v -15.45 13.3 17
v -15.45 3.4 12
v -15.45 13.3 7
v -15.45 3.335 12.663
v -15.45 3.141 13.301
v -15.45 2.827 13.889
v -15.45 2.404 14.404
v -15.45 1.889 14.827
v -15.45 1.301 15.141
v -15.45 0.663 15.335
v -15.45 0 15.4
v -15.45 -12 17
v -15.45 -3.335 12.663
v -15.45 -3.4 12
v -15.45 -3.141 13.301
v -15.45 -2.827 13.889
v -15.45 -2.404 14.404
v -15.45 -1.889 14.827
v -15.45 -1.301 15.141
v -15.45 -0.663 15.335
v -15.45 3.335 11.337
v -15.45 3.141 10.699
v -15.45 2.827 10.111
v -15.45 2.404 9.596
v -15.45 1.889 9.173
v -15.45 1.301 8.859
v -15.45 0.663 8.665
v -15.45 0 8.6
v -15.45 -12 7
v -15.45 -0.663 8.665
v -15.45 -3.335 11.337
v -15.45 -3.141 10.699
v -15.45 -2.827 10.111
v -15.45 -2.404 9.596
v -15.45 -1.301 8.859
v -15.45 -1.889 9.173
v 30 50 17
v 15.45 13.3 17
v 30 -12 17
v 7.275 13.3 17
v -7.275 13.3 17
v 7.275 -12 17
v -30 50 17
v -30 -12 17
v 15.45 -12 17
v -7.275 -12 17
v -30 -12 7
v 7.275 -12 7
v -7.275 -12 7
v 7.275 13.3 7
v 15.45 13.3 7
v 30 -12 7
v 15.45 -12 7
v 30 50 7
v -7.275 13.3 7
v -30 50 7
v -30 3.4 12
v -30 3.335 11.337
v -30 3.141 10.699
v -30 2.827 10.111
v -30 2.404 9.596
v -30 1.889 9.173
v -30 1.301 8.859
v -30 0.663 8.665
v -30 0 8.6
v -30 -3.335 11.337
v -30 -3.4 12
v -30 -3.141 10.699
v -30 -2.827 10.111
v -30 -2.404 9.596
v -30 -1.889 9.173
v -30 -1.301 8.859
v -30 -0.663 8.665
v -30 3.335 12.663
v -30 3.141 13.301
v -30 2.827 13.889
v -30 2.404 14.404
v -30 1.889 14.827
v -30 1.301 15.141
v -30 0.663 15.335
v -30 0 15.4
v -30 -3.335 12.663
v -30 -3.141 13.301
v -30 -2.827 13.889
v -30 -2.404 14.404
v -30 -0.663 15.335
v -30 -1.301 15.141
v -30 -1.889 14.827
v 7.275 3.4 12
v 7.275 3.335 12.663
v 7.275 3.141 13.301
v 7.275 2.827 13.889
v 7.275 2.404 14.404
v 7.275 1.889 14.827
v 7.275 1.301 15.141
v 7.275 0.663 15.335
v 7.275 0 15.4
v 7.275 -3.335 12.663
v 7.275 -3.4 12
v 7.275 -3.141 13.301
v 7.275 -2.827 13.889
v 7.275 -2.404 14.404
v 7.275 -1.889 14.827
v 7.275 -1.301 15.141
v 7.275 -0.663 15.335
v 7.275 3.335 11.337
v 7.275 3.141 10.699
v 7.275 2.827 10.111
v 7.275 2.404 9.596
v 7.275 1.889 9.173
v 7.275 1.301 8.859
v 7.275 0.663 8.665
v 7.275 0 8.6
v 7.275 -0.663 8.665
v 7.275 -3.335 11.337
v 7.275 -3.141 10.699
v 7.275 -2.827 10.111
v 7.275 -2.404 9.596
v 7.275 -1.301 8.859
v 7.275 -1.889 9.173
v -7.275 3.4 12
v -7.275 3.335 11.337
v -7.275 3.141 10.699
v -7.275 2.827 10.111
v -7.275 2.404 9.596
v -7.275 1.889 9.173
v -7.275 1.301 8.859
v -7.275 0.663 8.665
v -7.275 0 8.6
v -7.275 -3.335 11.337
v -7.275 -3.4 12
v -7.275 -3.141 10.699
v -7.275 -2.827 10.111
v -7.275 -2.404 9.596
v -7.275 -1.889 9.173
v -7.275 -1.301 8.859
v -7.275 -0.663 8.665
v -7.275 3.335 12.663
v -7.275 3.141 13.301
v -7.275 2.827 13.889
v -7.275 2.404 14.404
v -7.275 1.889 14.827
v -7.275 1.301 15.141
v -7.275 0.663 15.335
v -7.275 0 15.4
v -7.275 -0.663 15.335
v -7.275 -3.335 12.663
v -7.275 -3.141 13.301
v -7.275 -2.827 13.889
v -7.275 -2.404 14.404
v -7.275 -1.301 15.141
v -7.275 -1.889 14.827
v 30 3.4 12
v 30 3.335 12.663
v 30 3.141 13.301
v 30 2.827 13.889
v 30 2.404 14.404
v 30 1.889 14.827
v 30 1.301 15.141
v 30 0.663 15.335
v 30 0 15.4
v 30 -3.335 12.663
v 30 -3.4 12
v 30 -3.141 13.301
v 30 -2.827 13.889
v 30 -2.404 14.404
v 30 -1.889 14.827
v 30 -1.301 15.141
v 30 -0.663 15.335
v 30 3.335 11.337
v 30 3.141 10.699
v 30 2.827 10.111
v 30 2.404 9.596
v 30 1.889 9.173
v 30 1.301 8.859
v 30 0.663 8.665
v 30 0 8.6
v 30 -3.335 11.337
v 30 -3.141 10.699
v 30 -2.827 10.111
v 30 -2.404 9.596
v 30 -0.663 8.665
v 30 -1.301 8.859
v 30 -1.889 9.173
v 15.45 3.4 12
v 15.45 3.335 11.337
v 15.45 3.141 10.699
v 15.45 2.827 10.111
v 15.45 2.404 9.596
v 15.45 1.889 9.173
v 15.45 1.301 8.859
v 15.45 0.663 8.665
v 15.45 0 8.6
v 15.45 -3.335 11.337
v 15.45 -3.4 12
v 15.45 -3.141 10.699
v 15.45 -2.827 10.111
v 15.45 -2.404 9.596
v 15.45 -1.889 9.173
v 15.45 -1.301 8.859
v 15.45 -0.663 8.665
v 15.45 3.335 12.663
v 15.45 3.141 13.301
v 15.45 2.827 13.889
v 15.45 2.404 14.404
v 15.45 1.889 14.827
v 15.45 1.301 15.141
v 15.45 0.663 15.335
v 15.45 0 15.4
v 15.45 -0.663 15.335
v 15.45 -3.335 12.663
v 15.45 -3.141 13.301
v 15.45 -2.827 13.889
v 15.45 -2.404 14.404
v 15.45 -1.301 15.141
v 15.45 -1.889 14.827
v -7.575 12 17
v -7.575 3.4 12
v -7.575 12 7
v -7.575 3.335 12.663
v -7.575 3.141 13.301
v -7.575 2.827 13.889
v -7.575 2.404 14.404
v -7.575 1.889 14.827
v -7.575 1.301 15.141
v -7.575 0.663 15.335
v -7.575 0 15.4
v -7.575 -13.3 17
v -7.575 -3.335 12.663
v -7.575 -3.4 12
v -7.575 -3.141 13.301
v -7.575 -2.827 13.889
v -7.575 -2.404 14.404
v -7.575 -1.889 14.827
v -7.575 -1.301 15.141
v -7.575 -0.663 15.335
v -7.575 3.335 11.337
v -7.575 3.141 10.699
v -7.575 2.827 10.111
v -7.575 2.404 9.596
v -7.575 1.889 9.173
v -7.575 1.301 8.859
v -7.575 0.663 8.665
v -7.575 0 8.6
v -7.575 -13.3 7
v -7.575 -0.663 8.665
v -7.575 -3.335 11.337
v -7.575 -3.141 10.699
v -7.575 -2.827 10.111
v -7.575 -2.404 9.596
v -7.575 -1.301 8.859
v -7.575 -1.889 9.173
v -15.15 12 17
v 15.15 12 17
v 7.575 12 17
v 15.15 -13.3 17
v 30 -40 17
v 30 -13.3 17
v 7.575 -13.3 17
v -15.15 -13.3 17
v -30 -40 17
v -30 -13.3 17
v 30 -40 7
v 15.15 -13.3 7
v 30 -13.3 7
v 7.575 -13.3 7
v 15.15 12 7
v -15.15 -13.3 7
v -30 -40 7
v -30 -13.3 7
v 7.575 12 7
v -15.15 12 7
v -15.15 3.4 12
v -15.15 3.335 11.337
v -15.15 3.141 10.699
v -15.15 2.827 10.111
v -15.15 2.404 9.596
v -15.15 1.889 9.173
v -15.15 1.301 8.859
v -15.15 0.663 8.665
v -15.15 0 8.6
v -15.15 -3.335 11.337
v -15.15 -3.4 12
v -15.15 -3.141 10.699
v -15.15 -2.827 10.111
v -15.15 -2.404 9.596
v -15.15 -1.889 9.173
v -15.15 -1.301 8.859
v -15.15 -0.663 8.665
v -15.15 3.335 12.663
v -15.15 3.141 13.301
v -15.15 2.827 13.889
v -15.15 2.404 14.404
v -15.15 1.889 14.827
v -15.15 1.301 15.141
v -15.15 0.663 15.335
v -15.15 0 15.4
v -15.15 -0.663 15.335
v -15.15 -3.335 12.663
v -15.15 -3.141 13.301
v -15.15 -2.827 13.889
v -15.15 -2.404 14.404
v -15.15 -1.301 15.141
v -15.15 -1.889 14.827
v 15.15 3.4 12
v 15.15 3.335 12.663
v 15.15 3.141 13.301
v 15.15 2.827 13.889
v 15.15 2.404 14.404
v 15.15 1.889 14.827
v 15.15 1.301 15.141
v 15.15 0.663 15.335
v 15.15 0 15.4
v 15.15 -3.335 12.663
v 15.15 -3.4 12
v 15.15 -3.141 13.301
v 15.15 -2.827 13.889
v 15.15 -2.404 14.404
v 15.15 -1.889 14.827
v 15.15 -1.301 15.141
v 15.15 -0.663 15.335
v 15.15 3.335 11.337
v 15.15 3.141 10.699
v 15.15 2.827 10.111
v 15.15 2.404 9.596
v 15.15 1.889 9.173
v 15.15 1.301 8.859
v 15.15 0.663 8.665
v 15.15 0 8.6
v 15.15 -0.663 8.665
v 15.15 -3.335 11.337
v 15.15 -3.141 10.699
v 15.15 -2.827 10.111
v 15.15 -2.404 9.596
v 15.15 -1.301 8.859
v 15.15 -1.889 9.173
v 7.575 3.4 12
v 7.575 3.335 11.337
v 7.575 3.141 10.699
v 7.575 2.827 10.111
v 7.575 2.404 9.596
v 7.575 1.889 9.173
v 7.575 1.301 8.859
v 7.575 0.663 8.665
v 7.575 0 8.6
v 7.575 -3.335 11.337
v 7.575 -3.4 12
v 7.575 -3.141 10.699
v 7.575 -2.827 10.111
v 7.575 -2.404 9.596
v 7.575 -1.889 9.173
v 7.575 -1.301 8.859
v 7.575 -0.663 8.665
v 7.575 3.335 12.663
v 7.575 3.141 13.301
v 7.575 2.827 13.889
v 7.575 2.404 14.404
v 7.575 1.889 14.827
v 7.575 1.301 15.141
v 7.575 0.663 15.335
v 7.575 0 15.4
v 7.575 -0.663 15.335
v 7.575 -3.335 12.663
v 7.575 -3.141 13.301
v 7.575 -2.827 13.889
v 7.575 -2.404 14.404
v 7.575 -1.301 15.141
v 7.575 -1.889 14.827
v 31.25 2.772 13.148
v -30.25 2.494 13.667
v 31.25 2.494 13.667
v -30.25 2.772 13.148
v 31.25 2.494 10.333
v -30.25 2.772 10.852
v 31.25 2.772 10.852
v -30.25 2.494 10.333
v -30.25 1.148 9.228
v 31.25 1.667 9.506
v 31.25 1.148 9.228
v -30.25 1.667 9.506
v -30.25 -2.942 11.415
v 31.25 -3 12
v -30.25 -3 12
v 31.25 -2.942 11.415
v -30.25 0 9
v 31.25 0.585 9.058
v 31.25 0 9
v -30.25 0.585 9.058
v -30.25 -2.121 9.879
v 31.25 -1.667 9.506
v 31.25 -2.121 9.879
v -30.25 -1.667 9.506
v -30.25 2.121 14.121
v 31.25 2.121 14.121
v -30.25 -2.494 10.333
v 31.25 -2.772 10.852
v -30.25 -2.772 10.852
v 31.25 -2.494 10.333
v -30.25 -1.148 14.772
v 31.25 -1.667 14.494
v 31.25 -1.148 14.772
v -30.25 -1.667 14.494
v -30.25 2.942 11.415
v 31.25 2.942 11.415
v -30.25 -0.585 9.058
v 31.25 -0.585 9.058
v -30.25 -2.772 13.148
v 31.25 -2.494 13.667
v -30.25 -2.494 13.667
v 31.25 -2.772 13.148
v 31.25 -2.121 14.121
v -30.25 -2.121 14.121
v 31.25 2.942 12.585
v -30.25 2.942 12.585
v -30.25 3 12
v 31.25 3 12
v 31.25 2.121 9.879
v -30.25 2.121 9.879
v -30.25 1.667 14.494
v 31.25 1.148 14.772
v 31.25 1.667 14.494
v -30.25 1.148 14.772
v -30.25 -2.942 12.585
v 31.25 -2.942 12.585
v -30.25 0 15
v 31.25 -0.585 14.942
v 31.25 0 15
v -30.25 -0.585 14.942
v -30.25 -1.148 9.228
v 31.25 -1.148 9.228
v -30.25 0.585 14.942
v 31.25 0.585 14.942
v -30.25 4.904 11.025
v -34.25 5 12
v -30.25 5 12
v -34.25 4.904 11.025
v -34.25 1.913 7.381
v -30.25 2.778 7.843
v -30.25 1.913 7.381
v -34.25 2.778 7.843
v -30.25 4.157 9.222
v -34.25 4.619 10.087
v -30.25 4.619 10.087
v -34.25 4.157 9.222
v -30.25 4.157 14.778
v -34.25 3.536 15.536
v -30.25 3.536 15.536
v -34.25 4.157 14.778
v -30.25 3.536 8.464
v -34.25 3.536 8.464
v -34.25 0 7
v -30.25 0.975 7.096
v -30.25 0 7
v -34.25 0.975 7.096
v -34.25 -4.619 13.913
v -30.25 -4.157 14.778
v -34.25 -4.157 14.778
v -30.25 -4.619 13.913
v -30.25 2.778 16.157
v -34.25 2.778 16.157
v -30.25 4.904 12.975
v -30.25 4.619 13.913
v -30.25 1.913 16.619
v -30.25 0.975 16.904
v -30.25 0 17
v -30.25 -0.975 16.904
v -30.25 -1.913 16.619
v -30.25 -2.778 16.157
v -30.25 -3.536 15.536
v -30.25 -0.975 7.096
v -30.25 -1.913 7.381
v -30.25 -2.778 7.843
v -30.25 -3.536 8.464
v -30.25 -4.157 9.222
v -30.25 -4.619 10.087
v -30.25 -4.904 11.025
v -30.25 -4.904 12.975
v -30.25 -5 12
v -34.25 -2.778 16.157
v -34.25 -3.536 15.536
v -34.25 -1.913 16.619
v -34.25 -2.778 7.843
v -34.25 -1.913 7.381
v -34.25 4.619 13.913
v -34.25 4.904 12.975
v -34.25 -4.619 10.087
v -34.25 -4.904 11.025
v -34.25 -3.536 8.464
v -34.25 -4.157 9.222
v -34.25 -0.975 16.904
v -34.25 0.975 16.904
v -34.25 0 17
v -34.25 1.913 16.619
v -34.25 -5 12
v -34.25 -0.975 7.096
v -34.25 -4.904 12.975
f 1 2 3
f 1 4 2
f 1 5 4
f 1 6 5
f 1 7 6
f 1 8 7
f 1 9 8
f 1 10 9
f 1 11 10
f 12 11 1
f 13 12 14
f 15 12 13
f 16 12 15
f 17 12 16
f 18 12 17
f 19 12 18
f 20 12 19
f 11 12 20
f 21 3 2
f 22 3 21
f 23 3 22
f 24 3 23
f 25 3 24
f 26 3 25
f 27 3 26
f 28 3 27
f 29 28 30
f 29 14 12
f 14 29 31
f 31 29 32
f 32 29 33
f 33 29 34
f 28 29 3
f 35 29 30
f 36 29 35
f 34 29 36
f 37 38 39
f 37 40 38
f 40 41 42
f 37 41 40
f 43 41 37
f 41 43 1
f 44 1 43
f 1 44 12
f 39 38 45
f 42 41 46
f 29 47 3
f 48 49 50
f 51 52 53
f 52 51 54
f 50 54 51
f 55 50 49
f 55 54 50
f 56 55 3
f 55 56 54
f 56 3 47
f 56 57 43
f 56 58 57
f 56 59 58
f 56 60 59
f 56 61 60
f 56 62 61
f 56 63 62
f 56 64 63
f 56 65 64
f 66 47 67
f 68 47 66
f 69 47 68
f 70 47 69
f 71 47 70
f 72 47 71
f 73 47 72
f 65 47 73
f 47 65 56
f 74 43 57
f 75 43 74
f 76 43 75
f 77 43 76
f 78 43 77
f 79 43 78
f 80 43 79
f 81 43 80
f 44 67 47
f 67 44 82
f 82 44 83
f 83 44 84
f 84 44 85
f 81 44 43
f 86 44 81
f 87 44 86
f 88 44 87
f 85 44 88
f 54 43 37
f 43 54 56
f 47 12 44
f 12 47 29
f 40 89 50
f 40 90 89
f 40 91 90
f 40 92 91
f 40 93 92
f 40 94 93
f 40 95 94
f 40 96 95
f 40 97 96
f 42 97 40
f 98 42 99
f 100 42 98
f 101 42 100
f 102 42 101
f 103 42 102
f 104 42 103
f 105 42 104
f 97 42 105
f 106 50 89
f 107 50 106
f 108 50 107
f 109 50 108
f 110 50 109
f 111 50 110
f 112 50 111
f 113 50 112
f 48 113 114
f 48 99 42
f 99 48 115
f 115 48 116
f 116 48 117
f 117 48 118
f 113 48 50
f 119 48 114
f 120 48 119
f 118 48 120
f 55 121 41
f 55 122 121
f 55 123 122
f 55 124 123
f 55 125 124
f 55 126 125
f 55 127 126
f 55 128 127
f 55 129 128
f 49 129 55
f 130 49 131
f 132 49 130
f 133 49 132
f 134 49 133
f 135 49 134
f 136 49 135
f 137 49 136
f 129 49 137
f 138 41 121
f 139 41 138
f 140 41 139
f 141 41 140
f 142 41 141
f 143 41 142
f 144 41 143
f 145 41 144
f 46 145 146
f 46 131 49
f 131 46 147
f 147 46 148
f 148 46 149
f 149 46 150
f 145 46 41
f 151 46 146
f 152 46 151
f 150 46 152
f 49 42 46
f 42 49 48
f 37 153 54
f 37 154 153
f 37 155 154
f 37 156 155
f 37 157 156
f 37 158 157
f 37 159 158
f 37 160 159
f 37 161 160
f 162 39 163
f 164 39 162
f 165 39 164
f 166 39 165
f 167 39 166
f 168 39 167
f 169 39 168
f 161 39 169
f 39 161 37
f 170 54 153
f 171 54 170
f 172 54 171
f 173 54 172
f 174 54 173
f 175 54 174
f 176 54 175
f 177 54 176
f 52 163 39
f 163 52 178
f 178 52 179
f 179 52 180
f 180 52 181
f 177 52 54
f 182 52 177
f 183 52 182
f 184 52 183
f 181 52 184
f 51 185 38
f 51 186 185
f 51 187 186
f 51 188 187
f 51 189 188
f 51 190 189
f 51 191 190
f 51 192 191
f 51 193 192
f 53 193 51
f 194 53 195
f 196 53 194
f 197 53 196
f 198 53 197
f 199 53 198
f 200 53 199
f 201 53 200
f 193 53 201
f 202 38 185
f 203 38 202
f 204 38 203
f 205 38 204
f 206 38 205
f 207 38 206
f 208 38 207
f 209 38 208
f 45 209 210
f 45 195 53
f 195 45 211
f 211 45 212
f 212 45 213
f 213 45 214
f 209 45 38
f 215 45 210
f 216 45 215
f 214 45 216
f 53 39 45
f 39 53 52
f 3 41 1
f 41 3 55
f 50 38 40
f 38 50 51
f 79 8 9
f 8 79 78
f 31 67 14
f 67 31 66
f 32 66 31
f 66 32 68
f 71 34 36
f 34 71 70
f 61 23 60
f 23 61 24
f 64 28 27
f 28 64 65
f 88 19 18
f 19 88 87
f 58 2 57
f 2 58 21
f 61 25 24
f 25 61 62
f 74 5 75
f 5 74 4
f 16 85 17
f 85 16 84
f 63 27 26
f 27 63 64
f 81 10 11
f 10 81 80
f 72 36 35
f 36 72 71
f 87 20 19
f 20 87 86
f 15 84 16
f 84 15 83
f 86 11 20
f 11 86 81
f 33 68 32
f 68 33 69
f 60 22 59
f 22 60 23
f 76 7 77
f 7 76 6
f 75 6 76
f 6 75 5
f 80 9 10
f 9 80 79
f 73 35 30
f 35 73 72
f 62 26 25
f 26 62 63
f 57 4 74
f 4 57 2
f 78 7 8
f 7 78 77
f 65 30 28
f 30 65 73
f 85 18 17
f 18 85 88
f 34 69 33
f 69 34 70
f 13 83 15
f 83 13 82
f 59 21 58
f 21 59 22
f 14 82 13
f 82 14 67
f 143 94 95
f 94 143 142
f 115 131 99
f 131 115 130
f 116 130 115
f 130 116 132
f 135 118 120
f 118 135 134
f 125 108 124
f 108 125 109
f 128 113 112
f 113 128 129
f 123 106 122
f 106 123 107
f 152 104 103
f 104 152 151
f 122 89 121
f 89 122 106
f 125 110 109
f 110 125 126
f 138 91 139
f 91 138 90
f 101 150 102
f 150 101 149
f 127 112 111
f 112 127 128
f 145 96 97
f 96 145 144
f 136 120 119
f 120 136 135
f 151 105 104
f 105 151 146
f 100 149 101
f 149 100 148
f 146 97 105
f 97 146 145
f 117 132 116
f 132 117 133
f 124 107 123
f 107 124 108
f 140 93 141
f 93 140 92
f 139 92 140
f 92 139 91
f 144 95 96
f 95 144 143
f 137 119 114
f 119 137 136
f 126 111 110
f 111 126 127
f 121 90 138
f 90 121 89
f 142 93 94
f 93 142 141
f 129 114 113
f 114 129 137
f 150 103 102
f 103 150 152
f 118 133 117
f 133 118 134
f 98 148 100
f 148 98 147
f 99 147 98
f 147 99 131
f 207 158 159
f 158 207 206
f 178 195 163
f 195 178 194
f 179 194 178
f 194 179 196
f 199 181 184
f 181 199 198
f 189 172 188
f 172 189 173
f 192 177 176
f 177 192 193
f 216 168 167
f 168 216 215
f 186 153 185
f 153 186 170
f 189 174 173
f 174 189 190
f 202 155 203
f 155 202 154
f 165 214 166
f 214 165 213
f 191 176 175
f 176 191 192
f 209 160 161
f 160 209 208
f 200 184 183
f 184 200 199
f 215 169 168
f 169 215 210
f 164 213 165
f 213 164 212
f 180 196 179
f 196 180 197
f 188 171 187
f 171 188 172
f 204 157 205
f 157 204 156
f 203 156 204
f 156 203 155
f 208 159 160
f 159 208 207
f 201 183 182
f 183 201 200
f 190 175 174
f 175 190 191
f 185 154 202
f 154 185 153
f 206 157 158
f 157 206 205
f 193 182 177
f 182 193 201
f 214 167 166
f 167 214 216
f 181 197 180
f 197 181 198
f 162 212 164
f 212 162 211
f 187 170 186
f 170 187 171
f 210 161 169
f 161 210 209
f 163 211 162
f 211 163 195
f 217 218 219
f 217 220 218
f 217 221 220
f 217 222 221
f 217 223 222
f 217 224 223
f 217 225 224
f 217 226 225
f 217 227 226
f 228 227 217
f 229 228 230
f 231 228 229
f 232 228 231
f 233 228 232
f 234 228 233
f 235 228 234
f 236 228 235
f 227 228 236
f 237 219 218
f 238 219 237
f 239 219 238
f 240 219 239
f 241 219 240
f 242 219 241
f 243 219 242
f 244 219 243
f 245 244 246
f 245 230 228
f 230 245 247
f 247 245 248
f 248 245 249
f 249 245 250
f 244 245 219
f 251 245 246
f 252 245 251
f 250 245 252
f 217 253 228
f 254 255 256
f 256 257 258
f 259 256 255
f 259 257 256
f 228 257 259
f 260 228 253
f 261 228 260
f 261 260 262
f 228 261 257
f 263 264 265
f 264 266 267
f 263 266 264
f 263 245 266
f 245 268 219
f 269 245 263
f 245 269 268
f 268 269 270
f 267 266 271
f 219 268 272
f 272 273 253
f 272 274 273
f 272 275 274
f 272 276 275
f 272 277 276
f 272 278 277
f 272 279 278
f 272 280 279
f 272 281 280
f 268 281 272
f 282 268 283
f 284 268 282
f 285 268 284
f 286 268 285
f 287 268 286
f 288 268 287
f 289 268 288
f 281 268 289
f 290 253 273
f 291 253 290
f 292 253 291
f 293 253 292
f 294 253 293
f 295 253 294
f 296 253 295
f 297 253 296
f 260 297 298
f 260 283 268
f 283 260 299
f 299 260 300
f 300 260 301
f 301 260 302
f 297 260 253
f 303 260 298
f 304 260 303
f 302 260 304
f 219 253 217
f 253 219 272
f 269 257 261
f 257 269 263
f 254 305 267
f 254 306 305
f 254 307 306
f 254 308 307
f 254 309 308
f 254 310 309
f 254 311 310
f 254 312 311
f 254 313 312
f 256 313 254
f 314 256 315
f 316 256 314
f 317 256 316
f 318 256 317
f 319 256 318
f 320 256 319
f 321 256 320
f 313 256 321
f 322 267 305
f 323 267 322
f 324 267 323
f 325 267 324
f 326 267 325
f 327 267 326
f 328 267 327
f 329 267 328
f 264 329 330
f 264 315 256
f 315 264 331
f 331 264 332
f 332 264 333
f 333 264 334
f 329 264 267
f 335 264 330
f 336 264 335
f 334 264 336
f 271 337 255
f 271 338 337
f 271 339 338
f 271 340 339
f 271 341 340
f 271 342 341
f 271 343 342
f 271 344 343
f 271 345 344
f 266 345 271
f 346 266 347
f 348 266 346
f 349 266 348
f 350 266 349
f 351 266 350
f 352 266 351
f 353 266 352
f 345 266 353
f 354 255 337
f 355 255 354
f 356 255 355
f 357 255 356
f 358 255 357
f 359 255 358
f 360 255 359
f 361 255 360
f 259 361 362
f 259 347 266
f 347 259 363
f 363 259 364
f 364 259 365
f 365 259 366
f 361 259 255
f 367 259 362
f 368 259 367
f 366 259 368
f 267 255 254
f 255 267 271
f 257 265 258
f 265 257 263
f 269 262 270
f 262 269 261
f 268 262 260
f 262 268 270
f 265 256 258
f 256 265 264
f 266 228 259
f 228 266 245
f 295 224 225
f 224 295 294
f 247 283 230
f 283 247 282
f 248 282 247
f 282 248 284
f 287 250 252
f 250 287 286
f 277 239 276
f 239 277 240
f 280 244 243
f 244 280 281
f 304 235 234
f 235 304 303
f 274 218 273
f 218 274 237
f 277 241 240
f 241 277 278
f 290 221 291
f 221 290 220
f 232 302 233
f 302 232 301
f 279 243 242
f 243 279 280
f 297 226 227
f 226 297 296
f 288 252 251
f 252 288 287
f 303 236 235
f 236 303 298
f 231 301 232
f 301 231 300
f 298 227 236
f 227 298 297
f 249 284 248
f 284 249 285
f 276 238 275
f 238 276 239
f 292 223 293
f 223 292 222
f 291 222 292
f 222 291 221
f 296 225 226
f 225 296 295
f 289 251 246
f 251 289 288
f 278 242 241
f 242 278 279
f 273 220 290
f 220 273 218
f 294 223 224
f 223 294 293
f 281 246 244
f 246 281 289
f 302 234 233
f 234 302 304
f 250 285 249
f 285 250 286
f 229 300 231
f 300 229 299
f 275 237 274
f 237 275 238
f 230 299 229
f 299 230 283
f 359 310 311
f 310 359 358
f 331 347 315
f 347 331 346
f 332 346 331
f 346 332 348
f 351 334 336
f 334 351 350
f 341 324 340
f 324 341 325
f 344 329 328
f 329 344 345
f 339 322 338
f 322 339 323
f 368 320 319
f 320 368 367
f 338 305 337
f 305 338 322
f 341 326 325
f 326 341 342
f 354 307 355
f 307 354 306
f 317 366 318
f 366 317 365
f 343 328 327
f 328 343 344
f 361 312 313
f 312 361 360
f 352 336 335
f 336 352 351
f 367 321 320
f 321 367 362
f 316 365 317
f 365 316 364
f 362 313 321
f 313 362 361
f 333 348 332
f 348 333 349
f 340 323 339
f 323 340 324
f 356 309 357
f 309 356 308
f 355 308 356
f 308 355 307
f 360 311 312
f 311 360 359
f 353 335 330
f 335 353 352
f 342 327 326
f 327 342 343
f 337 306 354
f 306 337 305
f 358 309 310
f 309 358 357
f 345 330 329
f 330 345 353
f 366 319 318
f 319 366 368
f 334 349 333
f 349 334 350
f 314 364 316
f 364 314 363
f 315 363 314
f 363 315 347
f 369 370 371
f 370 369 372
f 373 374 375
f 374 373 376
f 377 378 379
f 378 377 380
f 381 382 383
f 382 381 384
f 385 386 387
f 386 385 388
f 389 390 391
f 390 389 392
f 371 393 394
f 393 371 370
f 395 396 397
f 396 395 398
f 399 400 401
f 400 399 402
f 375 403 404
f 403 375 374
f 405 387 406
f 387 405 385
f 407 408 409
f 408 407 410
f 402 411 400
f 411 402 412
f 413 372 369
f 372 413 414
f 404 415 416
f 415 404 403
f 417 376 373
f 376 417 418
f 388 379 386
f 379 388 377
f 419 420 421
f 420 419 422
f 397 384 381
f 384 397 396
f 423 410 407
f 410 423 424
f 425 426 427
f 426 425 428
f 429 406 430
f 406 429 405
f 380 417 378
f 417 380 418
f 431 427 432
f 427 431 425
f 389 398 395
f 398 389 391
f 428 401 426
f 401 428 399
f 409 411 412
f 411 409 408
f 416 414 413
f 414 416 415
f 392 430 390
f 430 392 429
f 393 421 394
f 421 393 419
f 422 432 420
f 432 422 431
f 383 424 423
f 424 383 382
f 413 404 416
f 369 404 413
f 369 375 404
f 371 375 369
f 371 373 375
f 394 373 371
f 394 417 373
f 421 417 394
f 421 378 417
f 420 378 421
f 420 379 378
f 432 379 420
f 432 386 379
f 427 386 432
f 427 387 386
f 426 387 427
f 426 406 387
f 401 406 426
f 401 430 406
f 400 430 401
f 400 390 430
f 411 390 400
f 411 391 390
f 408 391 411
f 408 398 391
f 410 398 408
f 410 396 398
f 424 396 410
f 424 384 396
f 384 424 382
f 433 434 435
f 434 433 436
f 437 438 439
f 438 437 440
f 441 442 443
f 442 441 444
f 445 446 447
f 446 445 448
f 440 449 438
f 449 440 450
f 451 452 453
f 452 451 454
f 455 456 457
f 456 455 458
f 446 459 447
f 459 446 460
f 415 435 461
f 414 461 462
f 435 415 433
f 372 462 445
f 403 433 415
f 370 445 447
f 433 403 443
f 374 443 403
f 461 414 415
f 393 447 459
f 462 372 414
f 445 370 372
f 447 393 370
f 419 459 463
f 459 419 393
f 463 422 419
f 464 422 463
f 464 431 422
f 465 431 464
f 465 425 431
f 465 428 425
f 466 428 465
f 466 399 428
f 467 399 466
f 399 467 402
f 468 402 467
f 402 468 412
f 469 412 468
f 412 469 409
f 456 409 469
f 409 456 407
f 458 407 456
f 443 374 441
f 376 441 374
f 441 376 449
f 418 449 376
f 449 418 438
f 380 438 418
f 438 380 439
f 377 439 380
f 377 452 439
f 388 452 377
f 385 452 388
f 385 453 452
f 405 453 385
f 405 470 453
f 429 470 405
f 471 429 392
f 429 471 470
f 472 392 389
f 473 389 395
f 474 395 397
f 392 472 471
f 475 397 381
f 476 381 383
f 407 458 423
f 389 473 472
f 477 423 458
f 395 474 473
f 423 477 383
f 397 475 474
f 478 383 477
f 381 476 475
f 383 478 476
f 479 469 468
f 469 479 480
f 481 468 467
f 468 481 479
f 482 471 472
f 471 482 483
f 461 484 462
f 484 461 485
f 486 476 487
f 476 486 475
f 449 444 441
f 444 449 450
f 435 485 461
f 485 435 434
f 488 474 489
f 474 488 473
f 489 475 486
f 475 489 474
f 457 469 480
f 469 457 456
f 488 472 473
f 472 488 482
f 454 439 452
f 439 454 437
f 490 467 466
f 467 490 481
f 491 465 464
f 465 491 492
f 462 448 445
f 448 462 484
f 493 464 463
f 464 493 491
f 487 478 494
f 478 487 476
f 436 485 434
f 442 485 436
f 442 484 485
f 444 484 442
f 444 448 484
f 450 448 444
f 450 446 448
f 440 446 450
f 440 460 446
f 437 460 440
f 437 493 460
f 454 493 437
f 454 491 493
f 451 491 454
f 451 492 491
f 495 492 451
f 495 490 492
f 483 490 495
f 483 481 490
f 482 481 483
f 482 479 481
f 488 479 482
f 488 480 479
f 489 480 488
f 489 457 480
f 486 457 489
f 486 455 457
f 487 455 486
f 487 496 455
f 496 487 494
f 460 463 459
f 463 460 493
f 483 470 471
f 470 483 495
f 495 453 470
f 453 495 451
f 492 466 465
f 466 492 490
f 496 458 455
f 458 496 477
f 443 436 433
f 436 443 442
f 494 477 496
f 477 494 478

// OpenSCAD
$fn = 32;

// ------------------------------------------------------------------------
// Butt hinge: hinge 60 mm, leaf swung 0 deg
// Every part is its own module, assembly() places every instance.
// ------------------------------------------------------------------------

// --- part 1 ---
module hinge_base() {
  difference() {
    union() {
      translate([-30, -12, -5]) cube([14.55, 62, 10]);
      translate([-7.275, -12, -5]) cube([14.55, 62, 10]);
      translate([15.45, -12, -5]) cube([14.55, 62, 10]);
      translate([-30, 13.3, -5]) cube([60, 36.7, 10]);
    }
    translate([-22.725, 0, 0]) rotate([0, 90, 0]) cylinder(h = 16.55, d = 6.8, center = true);
    translate([0, 0, 0]) rotate([0, 90, 0]) cylinder(h = 16.55, d = 6.8, center = true);
    translate([22.725, 0, 0]) rotate([0, 90, 0]) cylinder(h = 16.55, d = 6.8, center = true);
  }
}

// --- part 2 ---
module hinge_mover() {
  difference() {
    union() {
      translate([-15.15, -40, -5]) cube([7.575, 52, 10]);
      translate([7.575, -40, -5]) cube([7.575, 52, 10]);
      translate([-30, -40, -5]) cube([60, 26.7, 10]);
    }
    translate([-11.362, 0, 0]) rotate([0, 90, 0]) cylinder(h = 9.575, d = 6.8, center = true);
    translate([11.362, 0, 0]) rotate([0, 90, 0]) cylinder(h = 9.575, d = 6.8, center = true);
  }
}

// --- part 3 ---
module hinge_pin() {
  rotate([0, 90, 0]) cylinder(h = 62.5, d = 6, center = true);
  translate([-34.25, 0, 0]) rotate([0, 90, 0]) cylinder(h = 4, d = 10);
}

// --- assembly ---
module assembly() {
  color([0.80, 0.24, 0.20]) translate([0, 0, 12]) rotate([0, 0, 0]) hinge_base();
  color([0.20, 0.45, 0.75]) translate([0, 0, 12]) rotate([0, 0, 0]) hinge_mover();
  color([0.25, 0.62, 0.32]) translate([0, 0, 12]) rotate([0, 0, 0]) hinge_pin();
}

assembly();
